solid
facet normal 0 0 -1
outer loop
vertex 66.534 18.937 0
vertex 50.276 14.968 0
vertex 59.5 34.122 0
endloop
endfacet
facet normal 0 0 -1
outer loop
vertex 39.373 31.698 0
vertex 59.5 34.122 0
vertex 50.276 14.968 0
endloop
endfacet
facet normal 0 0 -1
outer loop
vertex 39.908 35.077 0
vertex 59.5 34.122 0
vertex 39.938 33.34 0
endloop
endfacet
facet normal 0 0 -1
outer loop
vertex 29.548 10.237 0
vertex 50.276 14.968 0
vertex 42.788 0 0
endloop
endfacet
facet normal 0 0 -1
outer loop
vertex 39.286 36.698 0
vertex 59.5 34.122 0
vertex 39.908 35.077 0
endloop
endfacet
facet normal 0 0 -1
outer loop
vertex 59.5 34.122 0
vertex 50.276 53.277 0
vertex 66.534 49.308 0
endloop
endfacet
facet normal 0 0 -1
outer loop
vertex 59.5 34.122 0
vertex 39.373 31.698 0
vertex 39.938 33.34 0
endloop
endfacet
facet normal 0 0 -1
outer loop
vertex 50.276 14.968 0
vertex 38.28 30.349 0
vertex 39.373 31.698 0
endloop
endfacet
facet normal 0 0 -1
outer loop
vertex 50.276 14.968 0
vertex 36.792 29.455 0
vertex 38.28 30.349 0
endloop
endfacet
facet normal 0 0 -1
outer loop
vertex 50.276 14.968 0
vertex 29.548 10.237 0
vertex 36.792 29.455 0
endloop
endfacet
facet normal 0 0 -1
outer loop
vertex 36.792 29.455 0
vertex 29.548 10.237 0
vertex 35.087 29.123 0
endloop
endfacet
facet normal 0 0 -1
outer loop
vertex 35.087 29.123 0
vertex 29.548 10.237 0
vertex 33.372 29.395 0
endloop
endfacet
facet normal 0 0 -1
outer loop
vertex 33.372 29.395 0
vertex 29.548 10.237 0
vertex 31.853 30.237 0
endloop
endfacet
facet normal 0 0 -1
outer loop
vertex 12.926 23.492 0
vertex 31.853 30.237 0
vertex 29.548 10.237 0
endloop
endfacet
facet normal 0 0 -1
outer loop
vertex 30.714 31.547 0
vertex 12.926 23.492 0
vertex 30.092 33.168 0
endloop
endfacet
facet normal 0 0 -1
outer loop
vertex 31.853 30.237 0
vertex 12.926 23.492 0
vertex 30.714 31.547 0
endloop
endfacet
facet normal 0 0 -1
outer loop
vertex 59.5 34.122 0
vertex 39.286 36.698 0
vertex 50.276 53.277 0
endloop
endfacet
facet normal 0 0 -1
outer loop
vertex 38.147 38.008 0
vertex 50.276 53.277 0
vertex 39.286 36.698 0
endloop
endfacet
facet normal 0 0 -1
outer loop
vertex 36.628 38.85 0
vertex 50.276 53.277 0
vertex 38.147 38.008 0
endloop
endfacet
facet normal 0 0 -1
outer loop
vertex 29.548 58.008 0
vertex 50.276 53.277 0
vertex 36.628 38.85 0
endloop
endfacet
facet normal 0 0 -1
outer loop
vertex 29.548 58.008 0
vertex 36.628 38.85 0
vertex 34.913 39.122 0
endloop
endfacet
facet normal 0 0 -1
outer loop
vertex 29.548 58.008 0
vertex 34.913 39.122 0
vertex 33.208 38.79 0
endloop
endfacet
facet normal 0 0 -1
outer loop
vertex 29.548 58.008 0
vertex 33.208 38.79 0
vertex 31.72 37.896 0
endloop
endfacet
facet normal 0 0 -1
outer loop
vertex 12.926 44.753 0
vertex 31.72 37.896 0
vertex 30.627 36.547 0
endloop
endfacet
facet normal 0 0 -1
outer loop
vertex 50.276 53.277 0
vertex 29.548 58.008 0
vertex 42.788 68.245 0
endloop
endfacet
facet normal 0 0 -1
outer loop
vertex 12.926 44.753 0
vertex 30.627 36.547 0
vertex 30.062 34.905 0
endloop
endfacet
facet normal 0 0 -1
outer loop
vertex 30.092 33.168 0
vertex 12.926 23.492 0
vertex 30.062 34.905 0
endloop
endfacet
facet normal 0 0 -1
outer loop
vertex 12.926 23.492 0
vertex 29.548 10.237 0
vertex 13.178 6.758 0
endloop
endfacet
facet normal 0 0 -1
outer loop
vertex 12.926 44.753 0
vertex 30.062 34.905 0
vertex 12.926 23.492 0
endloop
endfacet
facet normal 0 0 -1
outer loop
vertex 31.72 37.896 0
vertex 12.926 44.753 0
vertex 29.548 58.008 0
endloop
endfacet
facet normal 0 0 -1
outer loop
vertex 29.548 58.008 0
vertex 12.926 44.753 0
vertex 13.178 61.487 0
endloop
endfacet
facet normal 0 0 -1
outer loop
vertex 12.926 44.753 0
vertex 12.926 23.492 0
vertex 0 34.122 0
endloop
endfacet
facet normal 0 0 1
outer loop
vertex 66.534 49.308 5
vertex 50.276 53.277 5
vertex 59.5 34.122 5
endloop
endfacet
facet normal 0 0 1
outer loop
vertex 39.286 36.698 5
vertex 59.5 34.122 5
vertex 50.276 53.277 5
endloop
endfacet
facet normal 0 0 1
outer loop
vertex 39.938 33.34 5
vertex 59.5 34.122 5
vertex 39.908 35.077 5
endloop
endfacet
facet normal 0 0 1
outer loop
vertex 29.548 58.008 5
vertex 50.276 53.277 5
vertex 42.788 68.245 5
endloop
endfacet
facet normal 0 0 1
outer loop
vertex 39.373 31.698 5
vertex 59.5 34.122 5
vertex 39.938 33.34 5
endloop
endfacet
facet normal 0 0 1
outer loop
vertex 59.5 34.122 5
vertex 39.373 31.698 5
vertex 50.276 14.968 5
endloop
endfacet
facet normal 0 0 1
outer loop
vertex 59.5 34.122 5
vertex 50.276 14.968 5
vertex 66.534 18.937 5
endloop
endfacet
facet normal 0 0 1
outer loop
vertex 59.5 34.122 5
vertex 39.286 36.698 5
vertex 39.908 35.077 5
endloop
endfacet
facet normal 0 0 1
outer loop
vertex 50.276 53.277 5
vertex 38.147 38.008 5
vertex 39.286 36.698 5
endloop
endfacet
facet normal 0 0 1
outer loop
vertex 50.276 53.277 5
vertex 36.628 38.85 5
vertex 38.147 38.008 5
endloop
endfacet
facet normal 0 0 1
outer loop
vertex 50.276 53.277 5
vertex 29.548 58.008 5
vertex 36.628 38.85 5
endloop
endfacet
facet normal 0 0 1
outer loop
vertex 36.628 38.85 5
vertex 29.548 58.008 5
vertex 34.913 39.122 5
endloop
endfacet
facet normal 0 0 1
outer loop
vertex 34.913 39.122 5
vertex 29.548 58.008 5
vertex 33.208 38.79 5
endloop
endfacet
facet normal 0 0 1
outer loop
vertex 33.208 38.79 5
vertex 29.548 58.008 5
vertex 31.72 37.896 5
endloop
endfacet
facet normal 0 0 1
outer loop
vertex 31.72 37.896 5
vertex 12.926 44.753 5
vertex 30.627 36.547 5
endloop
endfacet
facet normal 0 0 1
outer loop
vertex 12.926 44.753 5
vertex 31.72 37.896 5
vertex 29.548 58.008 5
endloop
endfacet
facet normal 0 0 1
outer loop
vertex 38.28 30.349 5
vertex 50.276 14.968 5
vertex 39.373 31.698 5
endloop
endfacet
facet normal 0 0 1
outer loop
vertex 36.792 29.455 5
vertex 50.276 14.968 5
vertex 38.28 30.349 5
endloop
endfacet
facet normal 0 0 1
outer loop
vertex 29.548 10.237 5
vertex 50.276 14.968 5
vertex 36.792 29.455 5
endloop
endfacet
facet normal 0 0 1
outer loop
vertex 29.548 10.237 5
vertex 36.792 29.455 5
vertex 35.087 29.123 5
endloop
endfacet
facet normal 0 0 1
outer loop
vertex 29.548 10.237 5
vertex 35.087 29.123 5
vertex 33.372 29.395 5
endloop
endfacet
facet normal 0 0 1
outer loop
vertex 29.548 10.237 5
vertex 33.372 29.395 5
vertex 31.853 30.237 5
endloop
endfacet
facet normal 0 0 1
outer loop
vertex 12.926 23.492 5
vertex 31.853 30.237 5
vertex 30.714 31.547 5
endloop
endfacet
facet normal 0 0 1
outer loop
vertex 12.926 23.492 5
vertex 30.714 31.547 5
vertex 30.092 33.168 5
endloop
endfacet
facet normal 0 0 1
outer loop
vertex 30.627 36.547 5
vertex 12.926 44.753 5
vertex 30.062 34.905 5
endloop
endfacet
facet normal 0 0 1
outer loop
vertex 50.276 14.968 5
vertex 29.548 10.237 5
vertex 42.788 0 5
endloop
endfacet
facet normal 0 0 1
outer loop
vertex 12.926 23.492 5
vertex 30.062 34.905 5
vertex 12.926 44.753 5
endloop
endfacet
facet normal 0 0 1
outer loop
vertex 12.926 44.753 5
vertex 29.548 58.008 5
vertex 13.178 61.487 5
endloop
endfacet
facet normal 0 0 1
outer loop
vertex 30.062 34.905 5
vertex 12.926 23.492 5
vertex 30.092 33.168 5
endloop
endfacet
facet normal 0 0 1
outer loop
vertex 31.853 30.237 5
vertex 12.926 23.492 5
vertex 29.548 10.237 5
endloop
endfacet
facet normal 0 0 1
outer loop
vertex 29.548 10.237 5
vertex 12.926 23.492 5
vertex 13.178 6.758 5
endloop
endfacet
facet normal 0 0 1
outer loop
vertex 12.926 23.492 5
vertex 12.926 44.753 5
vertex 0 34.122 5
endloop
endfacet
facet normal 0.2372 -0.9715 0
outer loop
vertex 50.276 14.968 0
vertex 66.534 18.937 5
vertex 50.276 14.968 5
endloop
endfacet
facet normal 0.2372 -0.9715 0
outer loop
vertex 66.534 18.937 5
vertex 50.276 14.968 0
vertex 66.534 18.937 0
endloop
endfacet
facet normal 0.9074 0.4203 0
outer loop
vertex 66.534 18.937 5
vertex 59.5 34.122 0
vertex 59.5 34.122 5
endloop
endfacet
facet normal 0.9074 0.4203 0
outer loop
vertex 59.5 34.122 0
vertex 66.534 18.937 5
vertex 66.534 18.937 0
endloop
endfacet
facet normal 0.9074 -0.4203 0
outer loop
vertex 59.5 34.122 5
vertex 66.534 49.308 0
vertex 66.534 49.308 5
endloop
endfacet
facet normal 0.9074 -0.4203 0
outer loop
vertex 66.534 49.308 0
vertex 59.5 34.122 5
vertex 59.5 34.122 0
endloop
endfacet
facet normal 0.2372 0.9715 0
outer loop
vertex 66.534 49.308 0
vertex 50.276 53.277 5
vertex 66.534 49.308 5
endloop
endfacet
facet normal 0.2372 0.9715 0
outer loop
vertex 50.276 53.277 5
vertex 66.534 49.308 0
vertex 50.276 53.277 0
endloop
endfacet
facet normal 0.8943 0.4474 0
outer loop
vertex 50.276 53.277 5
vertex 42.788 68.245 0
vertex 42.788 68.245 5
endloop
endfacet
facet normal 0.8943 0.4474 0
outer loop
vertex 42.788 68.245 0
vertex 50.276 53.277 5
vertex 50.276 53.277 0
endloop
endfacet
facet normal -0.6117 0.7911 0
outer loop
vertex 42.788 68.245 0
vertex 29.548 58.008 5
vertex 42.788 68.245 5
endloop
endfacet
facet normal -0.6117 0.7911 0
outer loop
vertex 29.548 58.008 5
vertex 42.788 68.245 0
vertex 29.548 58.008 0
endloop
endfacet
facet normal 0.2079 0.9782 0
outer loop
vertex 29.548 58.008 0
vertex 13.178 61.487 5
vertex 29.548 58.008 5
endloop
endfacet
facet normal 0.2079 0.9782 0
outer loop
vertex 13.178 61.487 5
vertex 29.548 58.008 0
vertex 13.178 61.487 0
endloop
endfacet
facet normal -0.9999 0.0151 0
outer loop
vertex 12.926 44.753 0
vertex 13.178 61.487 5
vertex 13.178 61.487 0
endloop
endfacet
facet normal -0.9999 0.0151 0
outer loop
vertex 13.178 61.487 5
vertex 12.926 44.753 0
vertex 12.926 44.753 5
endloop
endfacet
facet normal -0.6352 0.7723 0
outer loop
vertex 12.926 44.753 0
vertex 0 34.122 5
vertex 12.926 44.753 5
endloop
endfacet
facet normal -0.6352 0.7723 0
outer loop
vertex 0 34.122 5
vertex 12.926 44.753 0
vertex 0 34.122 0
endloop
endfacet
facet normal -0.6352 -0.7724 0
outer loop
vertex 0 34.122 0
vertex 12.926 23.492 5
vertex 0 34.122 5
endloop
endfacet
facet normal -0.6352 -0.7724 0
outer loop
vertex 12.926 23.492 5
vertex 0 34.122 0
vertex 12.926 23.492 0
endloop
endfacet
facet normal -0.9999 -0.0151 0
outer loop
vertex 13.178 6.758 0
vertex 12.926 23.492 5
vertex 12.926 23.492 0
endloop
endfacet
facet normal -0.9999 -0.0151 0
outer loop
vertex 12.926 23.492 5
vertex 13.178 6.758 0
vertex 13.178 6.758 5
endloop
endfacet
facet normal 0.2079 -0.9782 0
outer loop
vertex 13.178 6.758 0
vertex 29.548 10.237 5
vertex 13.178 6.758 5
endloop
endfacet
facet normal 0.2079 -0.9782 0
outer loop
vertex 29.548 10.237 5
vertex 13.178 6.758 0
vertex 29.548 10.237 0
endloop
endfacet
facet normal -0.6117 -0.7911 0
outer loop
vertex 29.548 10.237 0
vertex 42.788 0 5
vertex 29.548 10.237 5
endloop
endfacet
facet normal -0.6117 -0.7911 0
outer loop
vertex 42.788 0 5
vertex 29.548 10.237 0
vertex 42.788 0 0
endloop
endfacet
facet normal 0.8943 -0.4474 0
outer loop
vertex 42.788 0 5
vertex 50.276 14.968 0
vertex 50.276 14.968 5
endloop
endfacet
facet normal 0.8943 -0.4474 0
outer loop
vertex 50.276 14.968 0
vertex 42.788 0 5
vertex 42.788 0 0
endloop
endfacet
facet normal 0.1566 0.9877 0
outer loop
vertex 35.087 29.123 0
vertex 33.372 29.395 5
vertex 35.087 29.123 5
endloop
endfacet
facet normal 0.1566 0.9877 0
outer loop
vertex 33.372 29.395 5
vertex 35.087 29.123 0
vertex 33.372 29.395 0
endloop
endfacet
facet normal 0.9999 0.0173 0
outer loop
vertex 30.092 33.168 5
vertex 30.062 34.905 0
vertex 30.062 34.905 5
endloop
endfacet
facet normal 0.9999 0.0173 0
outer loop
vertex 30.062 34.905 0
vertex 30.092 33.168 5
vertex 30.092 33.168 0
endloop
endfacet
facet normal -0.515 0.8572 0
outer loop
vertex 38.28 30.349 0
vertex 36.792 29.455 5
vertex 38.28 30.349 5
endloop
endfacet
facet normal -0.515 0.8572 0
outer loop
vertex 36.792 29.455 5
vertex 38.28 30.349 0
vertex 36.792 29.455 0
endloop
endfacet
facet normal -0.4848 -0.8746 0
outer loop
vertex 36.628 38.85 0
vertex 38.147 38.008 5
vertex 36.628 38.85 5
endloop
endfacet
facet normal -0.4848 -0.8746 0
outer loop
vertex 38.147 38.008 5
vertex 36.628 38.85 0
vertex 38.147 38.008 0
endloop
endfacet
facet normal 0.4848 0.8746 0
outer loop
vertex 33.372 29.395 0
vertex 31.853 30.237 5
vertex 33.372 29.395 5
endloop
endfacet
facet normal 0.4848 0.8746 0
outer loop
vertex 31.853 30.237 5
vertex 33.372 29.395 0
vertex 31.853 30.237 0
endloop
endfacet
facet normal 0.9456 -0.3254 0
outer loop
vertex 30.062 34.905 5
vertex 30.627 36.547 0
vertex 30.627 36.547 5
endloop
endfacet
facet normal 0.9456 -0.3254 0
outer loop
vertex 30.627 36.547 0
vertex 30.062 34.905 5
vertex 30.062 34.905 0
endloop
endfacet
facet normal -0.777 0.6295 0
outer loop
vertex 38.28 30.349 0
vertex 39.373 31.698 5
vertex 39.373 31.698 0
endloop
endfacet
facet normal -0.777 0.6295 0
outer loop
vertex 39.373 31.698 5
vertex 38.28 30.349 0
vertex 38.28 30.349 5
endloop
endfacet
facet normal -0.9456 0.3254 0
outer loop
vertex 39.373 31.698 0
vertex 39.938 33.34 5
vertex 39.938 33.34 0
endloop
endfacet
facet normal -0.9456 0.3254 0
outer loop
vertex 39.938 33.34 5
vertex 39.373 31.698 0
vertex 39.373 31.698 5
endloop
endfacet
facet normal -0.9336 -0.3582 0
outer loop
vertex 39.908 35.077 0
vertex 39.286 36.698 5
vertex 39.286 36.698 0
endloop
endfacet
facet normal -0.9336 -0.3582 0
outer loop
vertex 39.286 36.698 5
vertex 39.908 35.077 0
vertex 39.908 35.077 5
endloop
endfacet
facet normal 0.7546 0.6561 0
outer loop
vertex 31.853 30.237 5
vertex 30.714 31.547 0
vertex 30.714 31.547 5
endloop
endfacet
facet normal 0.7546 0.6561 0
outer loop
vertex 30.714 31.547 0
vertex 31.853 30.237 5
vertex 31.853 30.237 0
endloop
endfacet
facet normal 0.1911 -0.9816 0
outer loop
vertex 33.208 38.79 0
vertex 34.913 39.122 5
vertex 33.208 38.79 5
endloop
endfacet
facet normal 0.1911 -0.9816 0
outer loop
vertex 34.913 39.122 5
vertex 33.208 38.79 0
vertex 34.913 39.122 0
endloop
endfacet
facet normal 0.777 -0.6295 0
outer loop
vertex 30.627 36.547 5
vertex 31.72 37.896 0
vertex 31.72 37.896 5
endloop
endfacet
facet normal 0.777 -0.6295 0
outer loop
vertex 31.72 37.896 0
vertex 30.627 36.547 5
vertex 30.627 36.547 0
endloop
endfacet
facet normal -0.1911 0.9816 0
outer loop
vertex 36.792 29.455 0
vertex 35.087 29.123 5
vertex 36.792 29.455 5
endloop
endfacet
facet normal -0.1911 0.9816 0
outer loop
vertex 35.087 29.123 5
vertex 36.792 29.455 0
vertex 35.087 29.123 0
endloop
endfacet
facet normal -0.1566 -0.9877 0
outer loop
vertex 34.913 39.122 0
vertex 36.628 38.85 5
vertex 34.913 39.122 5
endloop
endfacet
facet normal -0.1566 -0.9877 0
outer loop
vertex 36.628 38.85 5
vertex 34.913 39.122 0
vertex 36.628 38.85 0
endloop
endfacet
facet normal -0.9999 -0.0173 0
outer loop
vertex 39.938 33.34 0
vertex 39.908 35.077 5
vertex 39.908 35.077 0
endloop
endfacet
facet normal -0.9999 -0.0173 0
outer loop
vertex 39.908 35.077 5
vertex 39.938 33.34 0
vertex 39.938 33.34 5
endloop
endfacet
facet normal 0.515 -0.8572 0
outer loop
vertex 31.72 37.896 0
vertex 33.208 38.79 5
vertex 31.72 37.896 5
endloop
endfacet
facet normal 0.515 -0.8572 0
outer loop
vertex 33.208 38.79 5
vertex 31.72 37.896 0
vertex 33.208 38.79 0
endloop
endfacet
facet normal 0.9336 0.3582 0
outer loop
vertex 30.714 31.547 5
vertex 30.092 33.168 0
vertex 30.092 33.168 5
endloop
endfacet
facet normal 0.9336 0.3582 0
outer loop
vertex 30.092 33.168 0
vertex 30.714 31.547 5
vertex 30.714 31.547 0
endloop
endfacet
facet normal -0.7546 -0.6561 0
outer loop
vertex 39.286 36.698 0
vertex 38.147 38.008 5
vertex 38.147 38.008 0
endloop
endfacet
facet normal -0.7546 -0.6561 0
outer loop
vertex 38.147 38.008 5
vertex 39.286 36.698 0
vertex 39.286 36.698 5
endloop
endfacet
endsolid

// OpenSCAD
$fn = 32;

// ----------------------------------------------------------------------
// Star wheel: 7-point blunt, R35
// ----------------------------------------------------------------------

// --- parameters (mm) ---
n_points = 7;             // number of points / teeth
r_out = 35;               // tip radius
r_in = 24.5;              // root radius
bore_r = 5;               // centre bore radius
plate_t = 5;              // plate thickness, Z (extrusion height)
bore_d = 10;              // centre bore diameter

profile = [[0, 34.122], [12.926, 23.492], [13.178, 6.758], [29.548, 10.237], [42.788, 0], [50.276, 14.968], [66.534, 18.937], [59.5, 34.122], [66.534, 49.308], [50.276, 53.277], [42.788, 68.245], [29.548, 58.008], [13.178, 61.487], [12.926, 44.753]];  // primary outline, 14 points, counter clockwise
void_1 = [[39.908, 35.077], [39.286, 36.698], [38.147, 38.008], [36.628, 38.85], [34.913, 39.122], [33.208, 38.79], [31.72, 37.896], [30.627, 36.547], [30.062, 34.905], [30.092, 33.168], [30.714, 31.547], [31.853, 30.237], [33.372, 29.395], [35.087, 29.123], [36.792, 29.455], [38.28, 30.349], [39.373, 31.698], [39.938, 33.34]];  // centre bore, 18 points

// --- the one profile operation ---
difference() {
  linear_extrude(height = plate_t) polygon(points = profile);
  translate([0, 0, -1])
    linear_extrude(height = plate_t + 2) polygon(points = void_1);
}
